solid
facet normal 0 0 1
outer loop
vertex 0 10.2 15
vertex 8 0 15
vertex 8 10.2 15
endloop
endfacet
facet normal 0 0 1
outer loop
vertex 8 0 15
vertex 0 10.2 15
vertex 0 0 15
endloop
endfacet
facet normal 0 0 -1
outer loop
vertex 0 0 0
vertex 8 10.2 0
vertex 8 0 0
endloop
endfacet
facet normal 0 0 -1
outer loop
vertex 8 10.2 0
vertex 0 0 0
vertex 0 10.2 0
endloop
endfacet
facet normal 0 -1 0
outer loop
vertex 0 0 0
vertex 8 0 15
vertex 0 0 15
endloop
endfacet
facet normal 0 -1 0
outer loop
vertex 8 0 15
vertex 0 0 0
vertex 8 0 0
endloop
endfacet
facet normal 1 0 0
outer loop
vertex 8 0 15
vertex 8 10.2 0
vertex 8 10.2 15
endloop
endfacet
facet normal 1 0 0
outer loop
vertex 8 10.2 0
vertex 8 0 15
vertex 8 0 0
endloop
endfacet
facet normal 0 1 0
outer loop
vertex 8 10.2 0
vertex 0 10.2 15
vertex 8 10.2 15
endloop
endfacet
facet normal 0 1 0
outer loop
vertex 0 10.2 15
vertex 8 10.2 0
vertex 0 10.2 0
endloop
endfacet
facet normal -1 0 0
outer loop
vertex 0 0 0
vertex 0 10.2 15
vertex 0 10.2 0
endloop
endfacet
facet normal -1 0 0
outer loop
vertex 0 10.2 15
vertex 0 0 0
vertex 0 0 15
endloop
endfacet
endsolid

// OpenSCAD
$fn = 64;

block_x = 8.0;
block_y = 10.2;
block_z = 15.0;

cube([block_x, block_y, block_z], center=false);
